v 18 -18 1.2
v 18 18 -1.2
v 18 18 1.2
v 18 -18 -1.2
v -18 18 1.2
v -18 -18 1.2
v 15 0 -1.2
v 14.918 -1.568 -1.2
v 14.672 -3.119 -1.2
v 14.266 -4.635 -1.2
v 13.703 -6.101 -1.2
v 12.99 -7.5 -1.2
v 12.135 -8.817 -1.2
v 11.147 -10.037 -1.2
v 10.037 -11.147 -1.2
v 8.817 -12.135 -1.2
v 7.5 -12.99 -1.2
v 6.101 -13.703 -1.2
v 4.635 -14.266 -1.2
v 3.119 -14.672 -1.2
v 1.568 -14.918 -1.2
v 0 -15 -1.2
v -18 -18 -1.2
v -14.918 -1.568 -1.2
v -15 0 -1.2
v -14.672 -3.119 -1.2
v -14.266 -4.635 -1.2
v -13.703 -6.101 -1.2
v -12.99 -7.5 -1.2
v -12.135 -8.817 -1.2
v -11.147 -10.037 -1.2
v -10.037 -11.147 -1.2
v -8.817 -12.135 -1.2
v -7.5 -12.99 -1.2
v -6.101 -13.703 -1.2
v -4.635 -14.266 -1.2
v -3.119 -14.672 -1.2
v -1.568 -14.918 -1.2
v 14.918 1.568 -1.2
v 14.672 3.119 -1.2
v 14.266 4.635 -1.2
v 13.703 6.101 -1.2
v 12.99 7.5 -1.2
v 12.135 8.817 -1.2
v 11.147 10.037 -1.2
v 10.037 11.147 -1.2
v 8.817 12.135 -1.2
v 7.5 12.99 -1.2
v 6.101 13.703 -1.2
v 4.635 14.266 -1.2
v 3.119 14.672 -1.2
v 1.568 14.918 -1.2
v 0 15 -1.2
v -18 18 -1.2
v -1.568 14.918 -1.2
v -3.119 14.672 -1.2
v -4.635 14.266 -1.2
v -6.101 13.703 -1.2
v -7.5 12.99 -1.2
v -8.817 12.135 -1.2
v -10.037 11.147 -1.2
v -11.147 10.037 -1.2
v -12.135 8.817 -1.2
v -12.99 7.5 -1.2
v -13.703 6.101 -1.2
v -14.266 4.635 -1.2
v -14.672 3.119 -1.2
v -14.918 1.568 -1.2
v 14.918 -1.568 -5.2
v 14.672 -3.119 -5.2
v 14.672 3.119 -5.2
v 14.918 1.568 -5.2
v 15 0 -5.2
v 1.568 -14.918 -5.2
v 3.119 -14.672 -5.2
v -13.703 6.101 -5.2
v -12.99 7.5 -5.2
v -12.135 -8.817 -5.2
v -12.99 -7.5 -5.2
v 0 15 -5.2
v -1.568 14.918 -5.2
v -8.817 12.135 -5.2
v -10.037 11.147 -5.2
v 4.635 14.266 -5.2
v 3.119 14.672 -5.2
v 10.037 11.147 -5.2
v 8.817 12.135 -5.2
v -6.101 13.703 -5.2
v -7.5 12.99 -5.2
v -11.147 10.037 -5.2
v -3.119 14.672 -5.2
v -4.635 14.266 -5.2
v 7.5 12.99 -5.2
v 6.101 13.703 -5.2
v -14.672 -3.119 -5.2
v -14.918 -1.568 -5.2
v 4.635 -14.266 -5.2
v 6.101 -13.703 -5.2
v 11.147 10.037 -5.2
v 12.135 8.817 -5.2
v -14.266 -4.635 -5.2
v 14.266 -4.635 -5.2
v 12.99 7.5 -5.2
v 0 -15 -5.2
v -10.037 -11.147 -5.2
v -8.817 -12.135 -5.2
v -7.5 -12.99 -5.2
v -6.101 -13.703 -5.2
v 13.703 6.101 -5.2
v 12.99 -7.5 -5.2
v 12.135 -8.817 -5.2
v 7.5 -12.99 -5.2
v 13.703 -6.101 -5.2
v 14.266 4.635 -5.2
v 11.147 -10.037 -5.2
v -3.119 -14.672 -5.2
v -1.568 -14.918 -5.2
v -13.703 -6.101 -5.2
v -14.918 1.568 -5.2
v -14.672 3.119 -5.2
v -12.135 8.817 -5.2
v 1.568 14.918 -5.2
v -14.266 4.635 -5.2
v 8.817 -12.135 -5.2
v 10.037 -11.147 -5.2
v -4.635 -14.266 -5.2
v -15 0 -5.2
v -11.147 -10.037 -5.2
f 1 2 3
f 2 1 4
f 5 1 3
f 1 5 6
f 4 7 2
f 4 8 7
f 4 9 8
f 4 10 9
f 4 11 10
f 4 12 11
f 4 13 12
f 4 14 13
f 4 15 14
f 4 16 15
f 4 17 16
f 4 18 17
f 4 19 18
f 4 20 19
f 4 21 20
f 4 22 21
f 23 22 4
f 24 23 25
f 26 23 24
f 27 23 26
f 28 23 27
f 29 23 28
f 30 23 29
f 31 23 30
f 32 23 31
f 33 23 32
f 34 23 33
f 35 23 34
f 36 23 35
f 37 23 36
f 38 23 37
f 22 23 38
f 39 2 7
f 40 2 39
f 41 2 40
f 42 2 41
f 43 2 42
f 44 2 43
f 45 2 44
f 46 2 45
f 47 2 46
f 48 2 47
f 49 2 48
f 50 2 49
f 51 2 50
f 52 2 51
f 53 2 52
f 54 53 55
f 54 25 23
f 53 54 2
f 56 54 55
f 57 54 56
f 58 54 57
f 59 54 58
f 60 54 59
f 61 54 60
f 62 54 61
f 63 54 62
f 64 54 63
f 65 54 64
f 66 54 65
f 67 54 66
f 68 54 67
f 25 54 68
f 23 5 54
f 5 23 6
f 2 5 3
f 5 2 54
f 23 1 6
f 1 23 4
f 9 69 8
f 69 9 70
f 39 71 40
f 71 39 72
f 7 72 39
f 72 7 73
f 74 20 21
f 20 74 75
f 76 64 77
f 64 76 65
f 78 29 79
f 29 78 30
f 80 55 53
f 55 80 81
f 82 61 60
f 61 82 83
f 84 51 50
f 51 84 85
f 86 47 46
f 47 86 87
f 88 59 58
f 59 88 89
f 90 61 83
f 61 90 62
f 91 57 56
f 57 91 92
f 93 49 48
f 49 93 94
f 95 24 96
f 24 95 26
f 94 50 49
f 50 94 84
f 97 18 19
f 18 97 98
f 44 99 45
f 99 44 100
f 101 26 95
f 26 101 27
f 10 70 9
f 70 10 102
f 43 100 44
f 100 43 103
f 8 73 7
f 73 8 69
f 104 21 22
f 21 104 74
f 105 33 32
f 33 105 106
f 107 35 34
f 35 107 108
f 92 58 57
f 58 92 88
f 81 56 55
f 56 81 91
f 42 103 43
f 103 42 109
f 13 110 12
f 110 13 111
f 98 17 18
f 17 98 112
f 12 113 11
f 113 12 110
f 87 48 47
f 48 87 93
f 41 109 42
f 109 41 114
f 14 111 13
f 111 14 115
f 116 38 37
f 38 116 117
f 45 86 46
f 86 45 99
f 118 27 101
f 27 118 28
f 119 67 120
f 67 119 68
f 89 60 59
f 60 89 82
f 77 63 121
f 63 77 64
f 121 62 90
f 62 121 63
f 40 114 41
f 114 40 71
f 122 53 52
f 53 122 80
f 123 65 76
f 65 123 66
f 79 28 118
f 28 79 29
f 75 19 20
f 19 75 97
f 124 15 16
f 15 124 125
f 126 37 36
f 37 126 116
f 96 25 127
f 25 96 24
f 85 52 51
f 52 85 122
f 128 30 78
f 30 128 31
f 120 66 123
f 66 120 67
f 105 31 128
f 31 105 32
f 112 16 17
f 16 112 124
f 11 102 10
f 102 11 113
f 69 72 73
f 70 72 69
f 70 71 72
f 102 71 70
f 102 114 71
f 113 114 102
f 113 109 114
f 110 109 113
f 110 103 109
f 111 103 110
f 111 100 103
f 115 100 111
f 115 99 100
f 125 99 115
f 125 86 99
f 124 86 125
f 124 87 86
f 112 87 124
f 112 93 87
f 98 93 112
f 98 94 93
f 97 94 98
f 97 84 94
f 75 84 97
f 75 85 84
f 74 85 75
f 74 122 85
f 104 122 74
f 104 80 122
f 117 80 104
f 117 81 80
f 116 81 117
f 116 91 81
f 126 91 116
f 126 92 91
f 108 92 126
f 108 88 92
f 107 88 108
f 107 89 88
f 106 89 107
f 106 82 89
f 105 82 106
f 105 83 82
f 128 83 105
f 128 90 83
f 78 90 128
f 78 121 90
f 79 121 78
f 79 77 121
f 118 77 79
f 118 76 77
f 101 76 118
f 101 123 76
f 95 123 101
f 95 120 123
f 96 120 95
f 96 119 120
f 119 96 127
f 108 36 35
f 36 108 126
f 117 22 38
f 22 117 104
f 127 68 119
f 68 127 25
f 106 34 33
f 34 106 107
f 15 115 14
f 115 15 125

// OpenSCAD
// Press-fit end cap for 35 mm extrusion.
$fn = 60;
eps = 0.02;
profile = 35;
cap_t = 2.4;
wall = 2.5;
pin_d = profile - 2 * wall;
pin_l = 4;
union() {
    cube([profile + 1, profile + 1, cap_t], center = true);
    translate([0, 0, -cap_t / 2 - pin_l]) cylinder(d = pin_d, h = pin_l + eps);
}
